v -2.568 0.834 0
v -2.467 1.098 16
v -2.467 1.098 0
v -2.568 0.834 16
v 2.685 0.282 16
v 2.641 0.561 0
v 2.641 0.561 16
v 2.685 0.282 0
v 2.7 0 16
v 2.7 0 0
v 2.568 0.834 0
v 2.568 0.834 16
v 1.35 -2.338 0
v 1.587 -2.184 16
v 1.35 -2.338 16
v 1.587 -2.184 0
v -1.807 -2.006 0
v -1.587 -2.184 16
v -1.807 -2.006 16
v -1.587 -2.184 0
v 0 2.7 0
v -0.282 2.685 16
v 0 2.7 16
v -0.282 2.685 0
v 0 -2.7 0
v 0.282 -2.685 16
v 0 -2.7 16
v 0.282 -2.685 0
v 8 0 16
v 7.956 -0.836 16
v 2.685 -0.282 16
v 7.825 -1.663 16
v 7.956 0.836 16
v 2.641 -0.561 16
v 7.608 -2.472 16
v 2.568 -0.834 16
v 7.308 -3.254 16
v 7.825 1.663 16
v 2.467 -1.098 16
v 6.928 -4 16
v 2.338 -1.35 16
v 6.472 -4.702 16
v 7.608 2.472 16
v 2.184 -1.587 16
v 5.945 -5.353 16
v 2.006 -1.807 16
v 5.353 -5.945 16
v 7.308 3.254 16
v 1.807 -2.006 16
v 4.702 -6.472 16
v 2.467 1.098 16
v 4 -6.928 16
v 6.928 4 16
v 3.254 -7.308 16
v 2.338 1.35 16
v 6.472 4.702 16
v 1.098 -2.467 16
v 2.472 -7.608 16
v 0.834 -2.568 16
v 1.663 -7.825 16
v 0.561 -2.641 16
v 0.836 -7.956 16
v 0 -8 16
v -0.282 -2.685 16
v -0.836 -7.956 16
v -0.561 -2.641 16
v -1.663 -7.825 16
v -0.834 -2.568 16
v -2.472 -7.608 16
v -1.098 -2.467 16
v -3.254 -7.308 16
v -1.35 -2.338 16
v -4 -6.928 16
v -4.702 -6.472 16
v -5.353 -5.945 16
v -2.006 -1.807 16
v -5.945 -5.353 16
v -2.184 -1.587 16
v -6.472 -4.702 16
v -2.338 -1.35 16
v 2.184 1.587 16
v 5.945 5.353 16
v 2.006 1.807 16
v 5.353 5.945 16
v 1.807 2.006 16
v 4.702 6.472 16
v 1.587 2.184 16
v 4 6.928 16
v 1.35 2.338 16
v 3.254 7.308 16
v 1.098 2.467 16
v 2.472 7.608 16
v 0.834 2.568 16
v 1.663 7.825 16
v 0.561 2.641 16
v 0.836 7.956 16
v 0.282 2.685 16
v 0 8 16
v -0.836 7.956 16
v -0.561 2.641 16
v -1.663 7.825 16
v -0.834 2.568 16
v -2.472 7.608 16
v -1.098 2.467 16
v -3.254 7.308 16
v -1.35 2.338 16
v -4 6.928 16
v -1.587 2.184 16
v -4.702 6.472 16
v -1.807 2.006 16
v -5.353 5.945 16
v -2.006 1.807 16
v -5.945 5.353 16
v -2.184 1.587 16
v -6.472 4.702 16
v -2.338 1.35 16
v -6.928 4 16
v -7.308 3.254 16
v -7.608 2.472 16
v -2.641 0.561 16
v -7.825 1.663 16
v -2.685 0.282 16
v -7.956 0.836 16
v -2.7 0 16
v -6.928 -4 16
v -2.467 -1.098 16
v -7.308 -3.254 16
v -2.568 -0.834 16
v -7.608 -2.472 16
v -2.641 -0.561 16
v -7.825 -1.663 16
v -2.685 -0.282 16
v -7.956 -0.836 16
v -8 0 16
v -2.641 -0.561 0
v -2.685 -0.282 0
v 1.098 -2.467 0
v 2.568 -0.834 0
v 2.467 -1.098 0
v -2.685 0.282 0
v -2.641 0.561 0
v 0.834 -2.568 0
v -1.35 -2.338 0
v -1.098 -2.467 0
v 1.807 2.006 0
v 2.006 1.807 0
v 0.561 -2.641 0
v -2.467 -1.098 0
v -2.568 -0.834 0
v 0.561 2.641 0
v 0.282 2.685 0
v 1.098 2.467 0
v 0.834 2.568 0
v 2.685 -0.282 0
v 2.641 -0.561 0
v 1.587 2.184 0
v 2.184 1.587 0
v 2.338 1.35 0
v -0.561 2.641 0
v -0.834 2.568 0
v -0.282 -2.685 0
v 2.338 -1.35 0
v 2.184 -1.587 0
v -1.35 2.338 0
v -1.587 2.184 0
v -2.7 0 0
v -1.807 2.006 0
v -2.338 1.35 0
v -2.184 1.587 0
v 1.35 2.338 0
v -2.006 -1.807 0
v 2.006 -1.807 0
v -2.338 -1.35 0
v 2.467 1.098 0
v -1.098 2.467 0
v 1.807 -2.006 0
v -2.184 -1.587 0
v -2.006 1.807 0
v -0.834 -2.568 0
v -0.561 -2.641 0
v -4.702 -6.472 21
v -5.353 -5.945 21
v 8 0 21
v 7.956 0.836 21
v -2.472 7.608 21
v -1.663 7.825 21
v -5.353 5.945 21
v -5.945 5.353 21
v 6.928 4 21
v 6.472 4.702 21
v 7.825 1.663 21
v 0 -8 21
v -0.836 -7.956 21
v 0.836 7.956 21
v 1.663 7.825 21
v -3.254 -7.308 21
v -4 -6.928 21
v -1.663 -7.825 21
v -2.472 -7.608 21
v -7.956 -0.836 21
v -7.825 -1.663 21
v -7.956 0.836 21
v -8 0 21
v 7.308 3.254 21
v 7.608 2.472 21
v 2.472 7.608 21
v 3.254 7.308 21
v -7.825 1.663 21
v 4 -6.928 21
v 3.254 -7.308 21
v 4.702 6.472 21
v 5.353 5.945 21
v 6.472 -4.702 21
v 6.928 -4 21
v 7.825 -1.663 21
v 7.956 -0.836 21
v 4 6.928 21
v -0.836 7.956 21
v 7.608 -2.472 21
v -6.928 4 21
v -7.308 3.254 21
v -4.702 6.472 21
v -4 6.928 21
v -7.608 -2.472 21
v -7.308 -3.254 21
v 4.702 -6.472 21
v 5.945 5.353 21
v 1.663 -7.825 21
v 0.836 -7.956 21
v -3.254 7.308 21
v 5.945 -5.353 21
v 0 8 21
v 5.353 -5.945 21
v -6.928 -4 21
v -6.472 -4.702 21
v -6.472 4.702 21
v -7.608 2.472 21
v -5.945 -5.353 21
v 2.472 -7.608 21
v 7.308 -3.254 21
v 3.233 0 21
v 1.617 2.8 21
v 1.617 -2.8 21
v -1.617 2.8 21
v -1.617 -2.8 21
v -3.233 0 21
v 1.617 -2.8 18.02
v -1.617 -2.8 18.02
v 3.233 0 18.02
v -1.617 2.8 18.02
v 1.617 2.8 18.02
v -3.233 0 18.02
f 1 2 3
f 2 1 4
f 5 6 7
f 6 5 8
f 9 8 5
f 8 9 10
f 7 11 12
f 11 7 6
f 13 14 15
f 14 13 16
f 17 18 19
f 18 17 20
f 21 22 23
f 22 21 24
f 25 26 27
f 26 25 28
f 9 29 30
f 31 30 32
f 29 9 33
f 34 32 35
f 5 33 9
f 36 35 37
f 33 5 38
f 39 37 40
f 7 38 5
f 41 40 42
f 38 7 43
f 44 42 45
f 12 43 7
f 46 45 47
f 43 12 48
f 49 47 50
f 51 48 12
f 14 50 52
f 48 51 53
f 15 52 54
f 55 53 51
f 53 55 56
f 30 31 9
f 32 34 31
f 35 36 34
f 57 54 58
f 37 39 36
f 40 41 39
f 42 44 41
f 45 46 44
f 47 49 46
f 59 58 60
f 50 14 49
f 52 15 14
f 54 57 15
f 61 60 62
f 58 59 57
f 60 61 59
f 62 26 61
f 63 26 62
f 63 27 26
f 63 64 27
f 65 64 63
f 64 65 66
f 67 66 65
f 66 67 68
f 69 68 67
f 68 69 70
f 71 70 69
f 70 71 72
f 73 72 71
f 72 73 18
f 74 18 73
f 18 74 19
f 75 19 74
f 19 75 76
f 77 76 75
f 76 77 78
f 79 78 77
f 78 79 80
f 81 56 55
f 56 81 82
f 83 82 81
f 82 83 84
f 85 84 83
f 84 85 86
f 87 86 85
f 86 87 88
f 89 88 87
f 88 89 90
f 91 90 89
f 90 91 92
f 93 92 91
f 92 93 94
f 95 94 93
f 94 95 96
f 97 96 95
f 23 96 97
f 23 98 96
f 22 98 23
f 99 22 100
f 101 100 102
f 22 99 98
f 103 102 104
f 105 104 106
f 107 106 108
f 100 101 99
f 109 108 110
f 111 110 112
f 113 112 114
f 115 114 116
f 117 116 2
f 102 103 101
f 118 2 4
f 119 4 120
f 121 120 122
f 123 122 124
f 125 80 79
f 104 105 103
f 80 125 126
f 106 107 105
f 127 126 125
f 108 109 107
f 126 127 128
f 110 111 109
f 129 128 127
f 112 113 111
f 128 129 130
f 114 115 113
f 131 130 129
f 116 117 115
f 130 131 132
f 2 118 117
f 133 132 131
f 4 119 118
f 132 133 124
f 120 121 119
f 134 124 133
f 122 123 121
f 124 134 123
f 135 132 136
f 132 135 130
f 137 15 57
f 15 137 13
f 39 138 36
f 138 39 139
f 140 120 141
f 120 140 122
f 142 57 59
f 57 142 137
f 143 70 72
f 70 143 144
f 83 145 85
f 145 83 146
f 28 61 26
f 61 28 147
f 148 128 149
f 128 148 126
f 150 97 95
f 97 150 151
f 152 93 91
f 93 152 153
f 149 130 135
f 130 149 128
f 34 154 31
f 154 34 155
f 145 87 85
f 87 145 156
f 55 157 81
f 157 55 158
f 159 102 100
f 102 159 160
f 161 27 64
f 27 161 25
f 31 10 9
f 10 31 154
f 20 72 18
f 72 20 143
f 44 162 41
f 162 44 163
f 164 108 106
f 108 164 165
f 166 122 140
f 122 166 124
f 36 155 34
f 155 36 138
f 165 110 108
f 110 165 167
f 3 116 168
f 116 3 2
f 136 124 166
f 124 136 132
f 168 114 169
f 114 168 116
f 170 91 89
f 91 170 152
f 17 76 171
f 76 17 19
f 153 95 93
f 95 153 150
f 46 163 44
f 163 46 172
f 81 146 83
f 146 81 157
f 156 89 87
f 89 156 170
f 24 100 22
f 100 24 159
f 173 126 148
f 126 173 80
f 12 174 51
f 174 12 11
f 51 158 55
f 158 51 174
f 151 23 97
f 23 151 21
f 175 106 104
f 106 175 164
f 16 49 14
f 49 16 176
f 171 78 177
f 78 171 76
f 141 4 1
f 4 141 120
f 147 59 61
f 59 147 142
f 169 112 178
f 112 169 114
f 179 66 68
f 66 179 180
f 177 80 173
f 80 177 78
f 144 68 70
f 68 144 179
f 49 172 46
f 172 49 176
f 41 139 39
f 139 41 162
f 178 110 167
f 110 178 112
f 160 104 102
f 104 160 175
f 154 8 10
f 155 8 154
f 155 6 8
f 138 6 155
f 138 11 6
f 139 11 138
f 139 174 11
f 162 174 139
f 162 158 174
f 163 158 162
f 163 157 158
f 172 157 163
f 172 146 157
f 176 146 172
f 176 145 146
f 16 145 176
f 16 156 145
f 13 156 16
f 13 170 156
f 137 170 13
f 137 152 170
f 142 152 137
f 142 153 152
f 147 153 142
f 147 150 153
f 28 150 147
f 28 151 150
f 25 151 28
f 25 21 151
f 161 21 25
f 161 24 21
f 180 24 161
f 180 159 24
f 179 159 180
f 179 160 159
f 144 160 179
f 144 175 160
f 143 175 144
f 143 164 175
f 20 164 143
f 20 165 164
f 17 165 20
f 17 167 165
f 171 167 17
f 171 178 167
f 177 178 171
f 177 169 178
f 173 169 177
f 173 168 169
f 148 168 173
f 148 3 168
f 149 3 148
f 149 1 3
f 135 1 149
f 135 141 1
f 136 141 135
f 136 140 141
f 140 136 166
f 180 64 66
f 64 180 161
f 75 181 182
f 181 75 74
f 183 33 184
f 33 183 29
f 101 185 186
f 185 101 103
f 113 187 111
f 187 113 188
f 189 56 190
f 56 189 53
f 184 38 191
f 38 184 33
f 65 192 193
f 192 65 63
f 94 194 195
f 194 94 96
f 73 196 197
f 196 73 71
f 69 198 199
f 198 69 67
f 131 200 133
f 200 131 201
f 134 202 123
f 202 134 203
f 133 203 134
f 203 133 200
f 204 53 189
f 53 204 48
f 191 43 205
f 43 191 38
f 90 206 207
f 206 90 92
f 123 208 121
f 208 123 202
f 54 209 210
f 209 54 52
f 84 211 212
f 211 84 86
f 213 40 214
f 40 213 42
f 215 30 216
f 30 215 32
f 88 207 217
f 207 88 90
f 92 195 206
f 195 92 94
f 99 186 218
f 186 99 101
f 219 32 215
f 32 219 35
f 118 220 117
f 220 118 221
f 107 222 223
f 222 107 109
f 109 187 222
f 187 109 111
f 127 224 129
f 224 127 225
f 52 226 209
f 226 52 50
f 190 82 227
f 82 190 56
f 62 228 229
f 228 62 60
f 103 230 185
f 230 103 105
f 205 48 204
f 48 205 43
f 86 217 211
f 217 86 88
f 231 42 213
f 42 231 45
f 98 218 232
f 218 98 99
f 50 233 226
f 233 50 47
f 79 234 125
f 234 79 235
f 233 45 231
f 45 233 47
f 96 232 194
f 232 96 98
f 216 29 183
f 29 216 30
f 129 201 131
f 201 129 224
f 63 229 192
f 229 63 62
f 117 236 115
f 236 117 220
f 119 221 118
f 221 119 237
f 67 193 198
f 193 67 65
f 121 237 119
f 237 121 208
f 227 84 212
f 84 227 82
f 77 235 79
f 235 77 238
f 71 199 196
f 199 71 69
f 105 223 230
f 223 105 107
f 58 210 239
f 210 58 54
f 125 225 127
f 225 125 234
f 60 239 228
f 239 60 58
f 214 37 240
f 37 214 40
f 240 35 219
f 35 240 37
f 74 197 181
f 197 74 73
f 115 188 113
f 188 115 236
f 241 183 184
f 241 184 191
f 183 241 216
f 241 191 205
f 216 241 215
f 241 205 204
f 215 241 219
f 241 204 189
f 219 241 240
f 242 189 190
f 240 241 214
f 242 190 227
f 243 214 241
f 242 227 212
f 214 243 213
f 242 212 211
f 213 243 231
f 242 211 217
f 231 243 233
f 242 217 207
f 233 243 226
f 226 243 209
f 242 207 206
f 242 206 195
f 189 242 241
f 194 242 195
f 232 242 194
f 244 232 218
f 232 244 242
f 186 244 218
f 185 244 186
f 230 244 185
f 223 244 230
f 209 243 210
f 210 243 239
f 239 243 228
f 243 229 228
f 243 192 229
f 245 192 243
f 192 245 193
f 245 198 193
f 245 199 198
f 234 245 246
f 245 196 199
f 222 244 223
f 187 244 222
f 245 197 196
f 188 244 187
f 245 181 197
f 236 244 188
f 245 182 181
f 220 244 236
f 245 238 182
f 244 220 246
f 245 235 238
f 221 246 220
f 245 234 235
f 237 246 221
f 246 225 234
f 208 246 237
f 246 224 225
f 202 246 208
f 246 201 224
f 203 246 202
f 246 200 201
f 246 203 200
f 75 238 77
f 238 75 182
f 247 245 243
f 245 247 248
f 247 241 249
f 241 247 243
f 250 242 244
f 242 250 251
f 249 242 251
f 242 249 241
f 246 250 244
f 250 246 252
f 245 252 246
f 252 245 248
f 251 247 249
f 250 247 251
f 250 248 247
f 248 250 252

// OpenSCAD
// Thumb screw, smooth-shank representation.
$fn = 60;
eps = 0.02;
shaft_d = 5.4;
head_d = 16;
shaft_l = 16;
head_h = 5;
difference() {
    union() { cylinder(d = shaft_d, h = shaft_l); translate([0, 0, shaft_l]) cylinder(d = head_d, h = head_h); }
    translate([0, 0, shaft_l + head_h - 3 + eps]) cylinder(d = head_d * 0.35 / cos(30), h = 3 + eps, $fn = 6);
}
